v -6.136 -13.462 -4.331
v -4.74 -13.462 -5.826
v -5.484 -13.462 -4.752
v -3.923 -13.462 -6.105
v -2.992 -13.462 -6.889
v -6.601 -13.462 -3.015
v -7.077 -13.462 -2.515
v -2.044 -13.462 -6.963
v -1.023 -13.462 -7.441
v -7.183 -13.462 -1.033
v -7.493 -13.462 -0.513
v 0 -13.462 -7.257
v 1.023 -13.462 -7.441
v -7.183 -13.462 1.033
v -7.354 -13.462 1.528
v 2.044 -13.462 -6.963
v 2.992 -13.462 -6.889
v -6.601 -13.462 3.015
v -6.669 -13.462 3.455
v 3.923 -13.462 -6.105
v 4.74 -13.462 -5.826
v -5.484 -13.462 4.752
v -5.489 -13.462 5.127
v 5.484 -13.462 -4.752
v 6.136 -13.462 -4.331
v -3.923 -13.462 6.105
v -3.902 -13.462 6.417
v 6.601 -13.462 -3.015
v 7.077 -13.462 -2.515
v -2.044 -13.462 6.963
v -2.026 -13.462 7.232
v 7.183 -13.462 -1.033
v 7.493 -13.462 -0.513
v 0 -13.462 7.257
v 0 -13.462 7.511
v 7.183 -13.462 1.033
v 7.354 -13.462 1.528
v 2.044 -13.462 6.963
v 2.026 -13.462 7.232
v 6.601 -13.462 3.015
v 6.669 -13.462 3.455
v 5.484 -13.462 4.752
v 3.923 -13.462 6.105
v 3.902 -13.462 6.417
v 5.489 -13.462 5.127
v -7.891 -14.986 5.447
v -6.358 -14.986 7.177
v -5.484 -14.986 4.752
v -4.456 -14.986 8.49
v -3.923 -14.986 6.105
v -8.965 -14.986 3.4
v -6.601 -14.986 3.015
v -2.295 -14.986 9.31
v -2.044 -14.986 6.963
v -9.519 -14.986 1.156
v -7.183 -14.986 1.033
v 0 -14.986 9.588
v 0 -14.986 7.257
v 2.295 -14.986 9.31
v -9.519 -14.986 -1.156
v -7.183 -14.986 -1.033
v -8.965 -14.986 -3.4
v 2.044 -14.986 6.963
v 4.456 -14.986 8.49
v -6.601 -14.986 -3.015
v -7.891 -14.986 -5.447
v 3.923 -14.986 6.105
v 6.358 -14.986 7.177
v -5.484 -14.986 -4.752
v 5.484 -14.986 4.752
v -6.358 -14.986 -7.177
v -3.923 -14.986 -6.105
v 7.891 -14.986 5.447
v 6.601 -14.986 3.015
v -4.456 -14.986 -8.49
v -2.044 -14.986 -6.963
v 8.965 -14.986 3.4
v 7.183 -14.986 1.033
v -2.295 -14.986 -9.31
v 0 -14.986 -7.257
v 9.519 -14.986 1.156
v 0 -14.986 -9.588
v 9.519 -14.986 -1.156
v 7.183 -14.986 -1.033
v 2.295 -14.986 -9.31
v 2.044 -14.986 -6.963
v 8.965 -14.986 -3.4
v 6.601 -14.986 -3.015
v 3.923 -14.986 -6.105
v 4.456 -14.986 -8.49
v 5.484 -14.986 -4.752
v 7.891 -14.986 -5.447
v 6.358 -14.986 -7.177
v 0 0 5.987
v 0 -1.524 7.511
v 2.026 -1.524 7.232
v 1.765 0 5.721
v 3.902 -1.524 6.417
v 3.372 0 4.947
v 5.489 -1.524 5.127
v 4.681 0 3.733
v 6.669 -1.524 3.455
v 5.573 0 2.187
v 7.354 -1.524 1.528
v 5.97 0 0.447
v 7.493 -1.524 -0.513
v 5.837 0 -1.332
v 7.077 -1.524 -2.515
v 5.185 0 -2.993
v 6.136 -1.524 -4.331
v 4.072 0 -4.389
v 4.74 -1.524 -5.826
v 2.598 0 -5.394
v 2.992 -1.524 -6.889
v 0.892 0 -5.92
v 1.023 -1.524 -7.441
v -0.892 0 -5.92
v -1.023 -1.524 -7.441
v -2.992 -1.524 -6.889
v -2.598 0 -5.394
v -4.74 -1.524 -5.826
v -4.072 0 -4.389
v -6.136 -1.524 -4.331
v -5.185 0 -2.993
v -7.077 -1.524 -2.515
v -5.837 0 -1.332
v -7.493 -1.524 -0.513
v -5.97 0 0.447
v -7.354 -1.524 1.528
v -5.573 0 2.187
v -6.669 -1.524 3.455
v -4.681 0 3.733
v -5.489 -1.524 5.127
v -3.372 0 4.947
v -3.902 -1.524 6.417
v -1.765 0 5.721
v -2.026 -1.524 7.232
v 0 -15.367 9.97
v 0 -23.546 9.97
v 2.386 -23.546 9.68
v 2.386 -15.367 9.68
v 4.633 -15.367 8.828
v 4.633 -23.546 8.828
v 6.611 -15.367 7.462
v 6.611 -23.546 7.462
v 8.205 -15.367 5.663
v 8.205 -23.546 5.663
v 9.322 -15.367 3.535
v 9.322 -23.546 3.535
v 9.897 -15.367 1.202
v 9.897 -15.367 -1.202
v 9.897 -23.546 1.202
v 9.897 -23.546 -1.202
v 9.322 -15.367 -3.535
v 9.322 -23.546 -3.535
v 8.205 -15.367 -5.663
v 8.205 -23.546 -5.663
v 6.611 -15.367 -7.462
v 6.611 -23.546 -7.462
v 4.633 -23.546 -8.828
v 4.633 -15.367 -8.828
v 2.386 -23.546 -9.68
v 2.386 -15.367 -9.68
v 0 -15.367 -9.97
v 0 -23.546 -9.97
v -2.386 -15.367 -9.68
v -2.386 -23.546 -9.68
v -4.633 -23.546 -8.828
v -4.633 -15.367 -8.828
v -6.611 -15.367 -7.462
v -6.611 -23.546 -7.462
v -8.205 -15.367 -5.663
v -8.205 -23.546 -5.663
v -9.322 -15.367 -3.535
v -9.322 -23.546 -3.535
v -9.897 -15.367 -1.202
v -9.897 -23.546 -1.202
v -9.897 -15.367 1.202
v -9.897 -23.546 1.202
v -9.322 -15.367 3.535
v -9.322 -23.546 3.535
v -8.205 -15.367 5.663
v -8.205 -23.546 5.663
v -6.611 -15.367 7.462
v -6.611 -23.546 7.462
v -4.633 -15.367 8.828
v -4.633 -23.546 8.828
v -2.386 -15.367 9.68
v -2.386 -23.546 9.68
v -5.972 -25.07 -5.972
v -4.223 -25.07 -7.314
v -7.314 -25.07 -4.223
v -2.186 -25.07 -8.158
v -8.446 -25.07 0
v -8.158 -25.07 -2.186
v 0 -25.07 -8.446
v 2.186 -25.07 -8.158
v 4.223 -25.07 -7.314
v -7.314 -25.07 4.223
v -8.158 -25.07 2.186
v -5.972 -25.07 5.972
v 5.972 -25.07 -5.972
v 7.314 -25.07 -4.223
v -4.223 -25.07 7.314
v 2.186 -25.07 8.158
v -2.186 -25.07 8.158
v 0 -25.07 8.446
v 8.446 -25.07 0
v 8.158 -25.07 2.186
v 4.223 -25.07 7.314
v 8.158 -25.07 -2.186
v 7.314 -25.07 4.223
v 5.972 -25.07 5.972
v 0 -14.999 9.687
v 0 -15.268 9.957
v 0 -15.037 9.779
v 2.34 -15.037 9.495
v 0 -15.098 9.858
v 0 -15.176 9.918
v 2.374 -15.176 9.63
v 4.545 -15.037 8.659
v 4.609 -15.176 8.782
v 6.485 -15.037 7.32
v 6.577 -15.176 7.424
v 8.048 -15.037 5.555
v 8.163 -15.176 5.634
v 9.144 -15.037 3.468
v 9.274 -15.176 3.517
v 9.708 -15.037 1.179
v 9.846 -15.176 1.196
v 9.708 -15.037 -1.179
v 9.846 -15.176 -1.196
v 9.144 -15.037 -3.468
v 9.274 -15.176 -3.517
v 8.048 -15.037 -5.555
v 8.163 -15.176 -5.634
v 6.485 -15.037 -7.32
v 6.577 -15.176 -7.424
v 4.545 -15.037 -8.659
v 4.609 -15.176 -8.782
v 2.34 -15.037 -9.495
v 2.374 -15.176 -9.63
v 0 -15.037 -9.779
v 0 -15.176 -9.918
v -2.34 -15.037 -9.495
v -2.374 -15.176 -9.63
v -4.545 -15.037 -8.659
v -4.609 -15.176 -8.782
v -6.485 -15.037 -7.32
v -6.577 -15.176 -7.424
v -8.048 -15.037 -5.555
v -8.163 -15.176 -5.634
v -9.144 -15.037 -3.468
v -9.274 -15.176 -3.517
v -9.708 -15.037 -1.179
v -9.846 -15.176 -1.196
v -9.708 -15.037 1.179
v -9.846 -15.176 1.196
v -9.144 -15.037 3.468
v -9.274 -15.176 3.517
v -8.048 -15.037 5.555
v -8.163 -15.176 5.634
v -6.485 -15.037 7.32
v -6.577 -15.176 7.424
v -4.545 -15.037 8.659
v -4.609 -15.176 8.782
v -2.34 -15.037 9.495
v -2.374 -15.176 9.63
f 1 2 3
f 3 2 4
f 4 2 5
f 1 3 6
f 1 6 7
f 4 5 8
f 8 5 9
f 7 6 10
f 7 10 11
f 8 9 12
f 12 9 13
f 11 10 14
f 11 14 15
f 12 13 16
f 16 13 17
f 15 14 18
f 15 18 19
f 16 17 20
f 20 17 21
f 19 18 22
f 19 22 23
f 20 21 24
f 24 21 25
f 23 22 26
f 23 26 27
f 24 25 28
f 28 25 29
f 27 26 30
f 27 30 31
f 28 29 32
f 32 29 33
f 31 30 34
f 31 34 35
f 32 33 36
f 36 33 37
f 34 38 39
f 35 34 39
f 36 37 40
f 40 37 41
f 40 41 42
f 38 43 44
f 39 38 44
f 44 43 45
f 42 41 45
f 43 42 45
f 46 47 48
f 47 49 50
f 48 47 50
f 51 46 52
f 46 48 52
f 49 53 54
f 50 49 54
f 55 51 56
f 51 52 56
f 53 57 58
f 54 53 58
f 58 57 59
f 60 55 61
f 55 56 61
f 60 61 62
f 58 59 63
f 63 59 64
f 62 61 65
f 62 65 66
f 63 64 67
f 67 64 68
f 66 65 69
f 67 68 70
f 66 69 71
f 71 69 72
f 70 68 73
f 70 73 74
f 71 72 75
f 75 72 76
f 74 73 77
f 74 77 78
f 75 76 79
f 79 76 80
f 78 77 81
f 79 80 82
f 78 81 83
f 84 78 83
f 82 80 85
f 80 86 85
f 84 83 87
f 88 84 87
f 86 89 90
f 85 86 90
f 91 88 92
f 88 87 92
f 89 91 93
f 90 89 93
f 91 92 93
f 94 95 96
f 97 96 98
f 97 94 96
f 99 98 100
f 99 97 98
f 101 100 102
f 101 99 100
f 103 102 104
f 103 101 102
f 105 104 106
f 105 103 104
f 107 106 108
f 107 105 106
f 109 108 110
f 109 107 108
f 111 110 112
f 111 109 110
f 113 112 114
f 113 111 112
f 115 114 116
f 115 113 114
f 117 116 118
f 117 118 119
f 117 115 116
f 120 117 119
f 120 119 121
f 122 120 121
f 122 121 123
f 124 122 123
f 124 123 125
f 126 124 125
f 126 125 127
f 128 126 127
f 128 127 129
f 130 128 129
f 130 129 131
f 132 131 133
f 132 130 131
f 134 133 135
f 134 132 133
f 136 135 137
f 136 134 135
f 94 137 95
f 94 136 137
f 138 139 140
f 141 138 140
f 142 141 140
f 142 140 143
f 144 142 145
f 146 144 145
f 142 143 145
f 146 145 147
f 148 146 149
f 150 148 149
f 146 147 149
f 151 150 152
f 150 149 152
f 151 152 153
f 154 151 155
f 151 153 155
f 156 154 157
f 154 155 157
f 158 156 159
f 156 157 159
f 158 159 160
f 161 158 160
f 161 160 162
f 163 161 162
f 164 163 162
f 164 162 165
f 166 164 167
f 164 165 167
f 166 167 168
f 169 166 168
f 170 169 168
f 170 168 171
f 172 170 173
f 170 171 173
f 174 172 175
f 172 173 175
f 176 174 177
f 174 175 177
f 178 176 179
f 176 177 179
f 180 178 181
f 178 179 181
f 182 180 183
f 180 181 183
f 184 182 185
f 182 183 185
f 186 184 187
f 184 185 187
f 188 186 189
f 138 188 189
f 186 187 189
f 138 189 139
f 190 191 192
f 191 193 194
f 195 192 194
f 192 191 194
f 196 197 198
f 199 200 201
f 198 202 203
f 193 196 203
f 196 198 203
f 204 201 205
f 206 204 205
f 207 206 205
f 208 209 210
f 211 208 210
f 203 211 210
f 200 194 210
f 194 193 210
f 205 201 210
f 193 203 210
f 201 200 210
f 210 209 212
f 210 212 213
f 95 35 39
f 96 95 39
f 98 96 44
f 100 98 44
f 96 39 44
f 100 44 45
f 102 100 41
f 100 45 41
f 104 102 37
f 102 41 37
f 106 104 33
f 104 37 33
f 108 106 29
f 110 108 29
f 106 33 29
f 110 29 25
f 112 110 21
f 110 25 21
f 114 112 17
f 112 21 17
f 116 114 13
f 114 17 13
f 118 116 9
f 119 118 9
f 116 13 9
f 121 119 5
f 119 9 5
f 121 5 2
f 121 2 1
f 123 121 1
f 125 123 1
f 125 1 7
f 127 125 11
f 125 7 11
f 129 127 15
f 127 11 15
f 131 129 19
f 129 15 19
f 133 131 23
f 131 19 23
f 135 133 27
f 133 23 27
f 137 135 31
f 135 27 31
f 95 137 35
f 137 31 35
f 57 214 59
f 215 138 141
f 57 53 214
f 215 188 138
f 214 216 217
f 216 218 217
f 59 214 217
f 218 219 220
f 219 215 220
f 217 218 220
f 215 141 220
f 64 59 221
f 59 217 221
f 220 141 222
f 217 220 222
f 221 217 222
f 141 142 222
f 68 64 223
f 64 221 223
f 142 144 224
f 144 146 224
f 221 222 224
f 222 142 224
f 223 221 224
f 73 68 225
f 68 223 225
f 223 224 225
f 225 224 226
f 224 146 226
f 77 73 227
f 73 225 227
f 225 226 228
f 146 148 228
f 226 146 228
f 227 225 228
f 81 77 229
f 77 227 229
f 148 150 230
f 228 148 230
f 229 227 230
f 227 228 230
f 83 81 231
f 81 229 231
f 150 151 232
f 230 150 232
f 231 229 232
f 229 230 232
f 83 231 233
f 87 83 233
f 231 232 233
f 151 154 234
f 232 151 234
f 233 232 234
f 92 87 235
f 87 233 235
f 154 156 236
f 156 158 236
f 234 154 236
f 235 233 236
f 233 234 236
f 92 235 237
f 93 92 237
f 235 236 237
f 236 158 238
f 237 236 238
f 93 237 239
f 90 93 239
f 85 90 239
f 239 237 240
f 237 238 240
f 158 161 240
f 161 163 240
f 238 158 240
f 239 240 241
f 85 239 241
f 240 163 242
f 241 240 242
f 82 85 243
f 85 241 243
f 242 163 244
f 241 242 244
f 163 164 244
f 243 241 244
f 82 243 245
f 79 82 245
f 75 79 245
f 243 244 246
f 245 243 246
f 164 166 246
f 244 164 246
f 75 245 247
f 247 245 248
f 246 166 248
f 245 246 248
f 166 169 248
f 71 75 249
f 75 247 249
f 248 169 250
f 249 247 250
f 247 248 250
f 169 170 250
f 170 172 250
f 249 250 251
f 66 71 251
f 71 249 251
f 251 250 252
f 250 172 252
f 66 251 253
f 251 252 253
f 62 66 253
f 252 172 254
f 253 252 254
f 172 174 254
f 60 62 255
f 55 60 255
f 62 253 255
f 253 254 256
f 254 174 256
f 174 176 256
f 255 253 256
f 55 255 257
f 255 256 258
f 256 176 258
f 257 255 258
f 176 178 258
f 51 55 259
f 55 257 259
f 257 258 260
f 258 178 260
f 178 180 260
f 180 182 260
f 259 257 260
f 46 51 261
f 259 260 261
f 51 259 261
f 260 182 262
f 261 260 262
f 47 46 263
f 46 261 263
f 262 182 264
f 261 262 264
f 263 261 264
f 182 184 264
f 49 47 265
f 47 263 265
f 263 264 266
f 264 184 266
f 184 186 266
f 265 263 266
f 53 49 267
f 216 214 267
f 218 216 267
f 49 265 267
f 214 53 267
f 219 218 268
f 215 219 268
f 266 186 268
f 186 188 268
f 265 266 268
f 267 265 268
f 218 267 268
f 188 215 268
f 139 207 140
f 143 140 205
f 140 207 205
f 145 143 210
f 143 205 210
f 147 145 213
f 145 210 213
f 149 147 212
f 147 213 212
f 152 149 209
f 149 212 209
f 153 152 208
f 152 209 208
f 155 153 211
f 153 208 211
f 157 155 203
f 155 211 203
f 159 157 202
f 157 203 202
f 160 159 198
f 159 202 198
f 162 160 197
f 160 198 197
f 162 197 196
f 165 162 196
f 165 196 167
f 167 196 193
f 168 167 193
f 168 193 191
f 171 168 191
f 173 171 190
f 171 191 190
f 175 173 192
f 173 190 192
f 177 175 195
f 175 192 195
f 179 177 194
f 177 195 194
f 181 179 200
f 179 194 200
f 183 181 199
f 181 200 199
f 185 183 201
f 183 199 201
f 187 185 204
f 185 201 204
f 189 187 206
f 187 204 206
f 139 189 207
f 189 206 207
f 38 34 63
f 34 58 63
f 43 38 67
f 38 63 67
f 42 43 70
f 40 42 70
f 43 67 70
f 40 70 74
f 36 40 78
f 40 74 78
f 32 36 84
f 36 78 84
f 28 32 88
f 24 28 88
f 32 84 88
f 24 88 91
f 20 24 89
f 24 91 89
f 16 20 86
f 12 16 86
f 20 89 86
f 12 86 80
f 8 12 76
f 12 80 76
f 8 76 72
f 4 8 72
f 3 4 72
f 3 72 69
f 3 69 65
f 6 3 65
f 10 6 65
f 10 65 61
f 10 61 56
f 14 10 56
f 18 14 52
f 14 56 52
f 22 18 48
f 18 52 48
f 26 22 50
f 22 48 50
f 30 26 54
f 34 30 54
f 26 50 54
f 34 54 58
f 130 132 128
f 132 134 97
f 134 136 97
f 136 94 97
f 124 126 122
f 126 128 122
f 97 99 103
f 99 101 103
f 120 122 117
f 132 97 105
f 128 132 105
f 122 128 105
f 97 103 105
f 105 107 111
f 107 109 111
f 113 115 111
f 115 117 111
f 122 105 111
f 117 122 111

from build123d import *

# Parameters (mm, degrees)
F2_SIZE = 1.524
F3_SIZE = 1.524
F4_R    = 0.381


with BuildPart() as f1:
    # F0 (on Right) → F1 (revolve)
    with BuildSketch(Plane.YZ):
        Polygon((-25.0698, 0), (0, 0), (0, 7.51078), (-13.462, 7.51078), (-13.462, 7.25678), (-14.986, 7.25678), (-14.986, 7.51078), (-14.986, 9.9695), (-25.0698, 9.9695), align=None)
    revolve(axis=Axis((0, -12.5349, 0), (0, 1, 0)))

    # F2
    f2_edges = [f1.edges().sort_by_distance(p)[0] for p in [
        (0, -25.0698, -9.9695),
    ]]
    chamfer(f2_edges, length=F2_SIZE)

    # F3
    f3_edges = [f1.edges().sort_by_distance(p)[0] for p in [
        (0, 0, -7.51078),
    ]]
    chamfer(f3_edges, length=F3_SIZE)

    # F4
    f4_edges = [f1.edges().sort_by_distance(p)[0] for p in [
        (0, -14.986, -9.9695),
    ]]
    fillet(f4_edges, radius=F4_R)


solid = f1.part
